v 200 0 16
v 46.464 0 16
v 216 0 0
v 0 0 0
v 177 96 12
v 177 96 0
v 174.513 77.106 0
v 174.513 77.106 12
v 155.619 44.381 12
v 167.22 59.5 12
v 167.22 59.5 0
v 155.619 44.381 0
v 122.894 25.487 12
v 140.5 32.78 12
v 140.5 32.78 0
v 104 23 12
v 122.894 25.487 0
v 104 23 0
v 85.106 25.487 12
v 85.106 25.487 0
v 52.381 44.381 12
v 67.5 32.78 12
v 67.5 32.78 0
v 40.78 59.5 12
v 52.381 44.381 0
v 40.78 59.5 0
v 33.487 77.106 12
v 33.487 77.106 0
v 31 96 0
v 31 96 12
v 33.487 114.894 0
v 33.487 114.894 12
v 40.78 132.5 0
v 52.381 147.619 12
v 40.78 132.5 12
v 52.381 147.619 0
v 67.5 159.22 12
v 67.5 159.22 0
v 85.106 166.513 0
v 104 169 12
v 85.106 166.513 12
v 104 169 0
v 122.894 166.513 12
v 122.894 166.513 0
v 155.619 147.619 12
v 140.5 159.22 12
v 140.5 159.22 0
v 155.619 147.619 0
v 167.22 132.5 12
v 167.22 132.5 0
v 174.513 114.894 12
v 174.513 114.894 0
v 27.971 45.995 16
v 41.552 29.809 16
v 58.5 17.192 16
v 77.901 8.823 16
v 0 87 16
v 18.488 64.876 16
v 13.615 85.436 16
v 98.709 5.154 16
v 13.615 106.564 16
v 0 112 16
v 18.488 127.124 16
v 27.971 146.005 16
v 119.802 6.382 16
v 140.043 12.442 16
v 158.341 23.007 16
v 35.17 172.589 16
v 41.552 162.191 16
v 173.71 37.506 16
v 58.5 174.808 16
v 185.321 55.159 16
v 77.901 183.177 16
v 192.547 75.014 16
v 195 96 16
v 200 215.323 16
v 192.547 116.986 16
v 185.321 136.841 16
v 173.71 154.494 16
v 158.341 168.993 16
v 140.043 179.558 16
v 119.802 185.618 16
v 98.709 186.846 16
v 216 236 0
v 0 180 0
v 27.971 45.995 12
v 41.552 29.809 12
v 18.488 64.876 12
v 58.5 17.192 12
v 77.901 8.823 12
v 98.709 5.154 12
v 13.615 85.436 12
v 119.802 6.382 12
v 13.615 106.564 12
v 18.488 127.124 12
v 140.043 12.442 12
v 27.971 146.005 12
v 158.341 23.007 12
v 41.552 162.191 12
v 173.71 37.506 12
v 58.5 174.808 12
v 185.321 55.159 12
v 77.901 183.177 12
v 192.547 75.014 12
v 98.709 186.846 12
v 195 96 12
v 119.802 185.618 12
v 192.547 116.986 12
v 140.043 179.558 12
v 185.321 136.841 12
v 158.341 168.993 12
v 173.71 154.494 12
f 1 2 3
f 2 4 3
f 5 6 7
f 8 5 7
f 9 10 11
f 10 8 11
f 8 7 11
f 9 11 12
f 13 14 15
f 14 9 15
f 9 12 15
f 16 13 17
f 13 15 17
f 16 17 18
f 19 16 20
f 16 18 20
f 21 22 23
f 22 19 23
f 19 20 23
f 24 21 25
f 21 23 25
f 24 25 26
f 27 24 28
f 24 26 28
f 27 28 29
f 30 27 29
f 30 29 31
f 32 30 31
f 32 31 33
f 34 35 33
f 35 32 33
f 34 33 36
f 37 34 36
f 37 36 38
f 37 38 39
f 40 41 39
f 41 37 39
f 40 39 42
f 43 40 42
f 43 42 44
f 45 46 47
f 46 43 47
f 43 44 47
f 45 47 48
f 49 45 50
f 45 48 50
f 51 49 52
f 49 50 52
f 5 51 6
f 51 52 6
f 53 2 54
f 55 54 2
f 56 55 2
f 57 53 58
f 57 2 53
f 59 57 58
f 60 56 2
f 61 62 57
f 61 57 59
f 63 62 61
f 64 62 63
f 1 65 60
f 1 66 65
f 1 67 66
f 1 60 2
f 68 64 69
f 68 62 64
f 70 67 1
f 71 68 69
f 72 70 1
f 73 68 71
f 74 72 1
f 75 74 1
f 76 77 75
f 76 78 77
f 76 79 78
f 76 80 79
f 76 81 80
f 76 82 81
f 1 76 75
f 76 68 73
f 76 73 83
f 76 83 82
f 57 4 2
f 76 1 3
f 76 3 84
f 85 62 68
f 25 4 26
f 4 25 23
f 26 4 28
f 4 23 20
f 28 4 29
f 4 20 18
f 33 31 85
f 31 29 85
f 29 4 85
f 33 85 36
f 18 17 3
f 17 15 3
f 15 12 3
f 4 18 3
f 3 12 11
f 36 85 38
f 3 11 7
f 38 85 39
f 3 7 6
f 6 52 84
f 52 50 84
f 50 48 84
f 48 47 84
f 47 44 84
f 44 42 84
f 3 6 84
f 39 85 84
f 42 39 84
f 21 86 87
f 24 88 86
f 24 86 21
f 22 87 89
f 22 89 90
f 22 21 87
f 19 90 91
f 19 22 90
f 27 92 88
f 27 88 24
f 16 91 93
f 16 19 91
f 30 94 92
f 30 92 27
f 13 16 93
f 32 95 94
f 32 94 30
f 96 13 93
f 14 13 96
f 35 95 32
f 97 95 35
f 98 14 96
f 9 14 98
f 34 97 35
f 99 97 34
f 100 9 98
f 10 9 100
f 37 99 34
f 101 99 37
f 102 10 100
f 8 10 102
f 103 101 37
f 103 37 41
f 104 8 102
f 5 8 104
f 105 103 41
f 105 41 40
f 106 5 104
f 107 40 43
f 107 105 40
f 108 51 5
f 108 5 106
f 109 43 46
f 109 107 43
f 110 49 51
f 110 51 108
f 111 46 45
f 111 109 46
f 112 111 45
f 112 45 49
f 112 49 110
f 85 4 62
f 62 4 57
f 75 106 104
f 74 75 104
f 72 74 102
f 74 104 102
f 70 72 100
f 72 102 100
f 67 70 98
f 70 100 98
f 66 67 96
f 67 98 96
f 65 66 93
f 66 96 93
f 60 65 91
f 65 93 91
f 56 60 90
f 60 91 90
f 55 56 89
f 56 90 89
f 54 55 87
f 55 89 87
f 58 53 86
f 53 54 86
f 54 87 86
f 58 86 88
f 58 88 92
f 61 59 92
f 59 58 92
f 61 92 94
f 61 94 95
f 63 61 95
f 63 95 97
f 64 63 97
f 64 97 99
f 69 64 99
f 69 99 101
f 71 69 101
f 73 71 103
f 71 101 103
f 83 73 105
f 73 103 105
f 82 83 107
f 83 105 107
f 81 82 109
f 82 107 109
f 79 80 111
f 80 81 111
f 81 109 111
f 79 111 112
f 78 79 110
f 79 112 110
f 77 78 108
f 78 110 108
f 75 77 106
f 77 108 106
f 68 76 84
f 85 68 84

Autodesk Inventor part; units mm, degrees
ref_plane "YZ Plane" through (0, 0, 0) normal (1, 0, 0) x (0, 1, 0)
sketch "Эскиз1" plane through (0, 0, 0) normal (0, 0, 1) x (1, 0, 0)
  line L0 (0, 0) -> (216, 0)
  circle A0 centre (104, 96) radius 73
  circle A1 centre (104, 96) radius 91
  line L1 (0, 180) -> (216, 236)
  line L2 (0, 87) -> (48, 0) construction
  line L3 (0, 0) -> (0, 180)
  line L4 (216, 236) -> (216, 0)
  line L5 (48, 192.4444) -> (0, 112) construction
  point P0 (43.1585, 192.0844)
  point P1 (92.1531, 205.8029)
  dimension "d2" = 146
  dimension "d3" = 182
  dimension "d6" = 236
  dimension "d7" = 180
  dimension "d8" = 96
  dimension "d15" = 48
  dimension "d16" = 48
  dimension "d17" = 87
  dimension "d18" = 68
  dimension "d22" = 216
extrude "Выдавливание2" add sketch "Эскиз1" along normal blind 12 contours A1
extrude "Выдавливание3" add sketch "Эскиз1" along normal blind 16 contours L3 L1 L4 L0
sketch "Эскиз4" plane through (0, 0, 0) normal (-1, 0, 0) x (0, 0, 1)
  line L0 (16, 180) -> (16, 0) projected
  point P0 (0, 0)
  point P1 (16, 87)
  point P2 (16, 112)
  dimension "d19" = 87
  dimension "d20" = 68
sketch "Эскиз5" plane through (0, 180, 16) normal (-0.2509622, 0.9679969, 0) x (0.9679969, 0.2509622, 0)
  line L0 (223.1412, 0) -> (0, 0) projected
  point P0 (-45.1732, 16)
  point P1 (48, 0)
  dimension "d21" = 48
ref_plane "РабПлоскость1" through (46.4639, 192.0462, 16) normal (-0.3670406, 0.2130535, 0.9054774) x (-0.9183225, -0.2380836, -0.3162278)
split "Разделение1" plane through (46.4639, 192.0462, 16) removes the side toward (-0.3670406, 0.2130535, 0.9054774)
sketch "Эскиз6" plane through (0, 0, 0) normal (0, -1, 0) x (1, 0, 0)
  line L0 (216, 16) -> (46.4639, 16) projected
  point P0 (0, 0)
ref_plane "РабПлоскость2" through (46.4639, 0, 16) normal (0.3207767, 0.1713163, -0.9315326) x (-0.945511, 0, -0.3255902)
split "Разделение2" plane through (46.4639, 0, 16) removes the side toward (-0.3207767, -0.1713163, 0.9315326)
chamfer "Фаска1" distance 16 angle 45 2 edges at (216, 118, 16) (131.2319, 214.0231, 16)
properties part number "Front1"
